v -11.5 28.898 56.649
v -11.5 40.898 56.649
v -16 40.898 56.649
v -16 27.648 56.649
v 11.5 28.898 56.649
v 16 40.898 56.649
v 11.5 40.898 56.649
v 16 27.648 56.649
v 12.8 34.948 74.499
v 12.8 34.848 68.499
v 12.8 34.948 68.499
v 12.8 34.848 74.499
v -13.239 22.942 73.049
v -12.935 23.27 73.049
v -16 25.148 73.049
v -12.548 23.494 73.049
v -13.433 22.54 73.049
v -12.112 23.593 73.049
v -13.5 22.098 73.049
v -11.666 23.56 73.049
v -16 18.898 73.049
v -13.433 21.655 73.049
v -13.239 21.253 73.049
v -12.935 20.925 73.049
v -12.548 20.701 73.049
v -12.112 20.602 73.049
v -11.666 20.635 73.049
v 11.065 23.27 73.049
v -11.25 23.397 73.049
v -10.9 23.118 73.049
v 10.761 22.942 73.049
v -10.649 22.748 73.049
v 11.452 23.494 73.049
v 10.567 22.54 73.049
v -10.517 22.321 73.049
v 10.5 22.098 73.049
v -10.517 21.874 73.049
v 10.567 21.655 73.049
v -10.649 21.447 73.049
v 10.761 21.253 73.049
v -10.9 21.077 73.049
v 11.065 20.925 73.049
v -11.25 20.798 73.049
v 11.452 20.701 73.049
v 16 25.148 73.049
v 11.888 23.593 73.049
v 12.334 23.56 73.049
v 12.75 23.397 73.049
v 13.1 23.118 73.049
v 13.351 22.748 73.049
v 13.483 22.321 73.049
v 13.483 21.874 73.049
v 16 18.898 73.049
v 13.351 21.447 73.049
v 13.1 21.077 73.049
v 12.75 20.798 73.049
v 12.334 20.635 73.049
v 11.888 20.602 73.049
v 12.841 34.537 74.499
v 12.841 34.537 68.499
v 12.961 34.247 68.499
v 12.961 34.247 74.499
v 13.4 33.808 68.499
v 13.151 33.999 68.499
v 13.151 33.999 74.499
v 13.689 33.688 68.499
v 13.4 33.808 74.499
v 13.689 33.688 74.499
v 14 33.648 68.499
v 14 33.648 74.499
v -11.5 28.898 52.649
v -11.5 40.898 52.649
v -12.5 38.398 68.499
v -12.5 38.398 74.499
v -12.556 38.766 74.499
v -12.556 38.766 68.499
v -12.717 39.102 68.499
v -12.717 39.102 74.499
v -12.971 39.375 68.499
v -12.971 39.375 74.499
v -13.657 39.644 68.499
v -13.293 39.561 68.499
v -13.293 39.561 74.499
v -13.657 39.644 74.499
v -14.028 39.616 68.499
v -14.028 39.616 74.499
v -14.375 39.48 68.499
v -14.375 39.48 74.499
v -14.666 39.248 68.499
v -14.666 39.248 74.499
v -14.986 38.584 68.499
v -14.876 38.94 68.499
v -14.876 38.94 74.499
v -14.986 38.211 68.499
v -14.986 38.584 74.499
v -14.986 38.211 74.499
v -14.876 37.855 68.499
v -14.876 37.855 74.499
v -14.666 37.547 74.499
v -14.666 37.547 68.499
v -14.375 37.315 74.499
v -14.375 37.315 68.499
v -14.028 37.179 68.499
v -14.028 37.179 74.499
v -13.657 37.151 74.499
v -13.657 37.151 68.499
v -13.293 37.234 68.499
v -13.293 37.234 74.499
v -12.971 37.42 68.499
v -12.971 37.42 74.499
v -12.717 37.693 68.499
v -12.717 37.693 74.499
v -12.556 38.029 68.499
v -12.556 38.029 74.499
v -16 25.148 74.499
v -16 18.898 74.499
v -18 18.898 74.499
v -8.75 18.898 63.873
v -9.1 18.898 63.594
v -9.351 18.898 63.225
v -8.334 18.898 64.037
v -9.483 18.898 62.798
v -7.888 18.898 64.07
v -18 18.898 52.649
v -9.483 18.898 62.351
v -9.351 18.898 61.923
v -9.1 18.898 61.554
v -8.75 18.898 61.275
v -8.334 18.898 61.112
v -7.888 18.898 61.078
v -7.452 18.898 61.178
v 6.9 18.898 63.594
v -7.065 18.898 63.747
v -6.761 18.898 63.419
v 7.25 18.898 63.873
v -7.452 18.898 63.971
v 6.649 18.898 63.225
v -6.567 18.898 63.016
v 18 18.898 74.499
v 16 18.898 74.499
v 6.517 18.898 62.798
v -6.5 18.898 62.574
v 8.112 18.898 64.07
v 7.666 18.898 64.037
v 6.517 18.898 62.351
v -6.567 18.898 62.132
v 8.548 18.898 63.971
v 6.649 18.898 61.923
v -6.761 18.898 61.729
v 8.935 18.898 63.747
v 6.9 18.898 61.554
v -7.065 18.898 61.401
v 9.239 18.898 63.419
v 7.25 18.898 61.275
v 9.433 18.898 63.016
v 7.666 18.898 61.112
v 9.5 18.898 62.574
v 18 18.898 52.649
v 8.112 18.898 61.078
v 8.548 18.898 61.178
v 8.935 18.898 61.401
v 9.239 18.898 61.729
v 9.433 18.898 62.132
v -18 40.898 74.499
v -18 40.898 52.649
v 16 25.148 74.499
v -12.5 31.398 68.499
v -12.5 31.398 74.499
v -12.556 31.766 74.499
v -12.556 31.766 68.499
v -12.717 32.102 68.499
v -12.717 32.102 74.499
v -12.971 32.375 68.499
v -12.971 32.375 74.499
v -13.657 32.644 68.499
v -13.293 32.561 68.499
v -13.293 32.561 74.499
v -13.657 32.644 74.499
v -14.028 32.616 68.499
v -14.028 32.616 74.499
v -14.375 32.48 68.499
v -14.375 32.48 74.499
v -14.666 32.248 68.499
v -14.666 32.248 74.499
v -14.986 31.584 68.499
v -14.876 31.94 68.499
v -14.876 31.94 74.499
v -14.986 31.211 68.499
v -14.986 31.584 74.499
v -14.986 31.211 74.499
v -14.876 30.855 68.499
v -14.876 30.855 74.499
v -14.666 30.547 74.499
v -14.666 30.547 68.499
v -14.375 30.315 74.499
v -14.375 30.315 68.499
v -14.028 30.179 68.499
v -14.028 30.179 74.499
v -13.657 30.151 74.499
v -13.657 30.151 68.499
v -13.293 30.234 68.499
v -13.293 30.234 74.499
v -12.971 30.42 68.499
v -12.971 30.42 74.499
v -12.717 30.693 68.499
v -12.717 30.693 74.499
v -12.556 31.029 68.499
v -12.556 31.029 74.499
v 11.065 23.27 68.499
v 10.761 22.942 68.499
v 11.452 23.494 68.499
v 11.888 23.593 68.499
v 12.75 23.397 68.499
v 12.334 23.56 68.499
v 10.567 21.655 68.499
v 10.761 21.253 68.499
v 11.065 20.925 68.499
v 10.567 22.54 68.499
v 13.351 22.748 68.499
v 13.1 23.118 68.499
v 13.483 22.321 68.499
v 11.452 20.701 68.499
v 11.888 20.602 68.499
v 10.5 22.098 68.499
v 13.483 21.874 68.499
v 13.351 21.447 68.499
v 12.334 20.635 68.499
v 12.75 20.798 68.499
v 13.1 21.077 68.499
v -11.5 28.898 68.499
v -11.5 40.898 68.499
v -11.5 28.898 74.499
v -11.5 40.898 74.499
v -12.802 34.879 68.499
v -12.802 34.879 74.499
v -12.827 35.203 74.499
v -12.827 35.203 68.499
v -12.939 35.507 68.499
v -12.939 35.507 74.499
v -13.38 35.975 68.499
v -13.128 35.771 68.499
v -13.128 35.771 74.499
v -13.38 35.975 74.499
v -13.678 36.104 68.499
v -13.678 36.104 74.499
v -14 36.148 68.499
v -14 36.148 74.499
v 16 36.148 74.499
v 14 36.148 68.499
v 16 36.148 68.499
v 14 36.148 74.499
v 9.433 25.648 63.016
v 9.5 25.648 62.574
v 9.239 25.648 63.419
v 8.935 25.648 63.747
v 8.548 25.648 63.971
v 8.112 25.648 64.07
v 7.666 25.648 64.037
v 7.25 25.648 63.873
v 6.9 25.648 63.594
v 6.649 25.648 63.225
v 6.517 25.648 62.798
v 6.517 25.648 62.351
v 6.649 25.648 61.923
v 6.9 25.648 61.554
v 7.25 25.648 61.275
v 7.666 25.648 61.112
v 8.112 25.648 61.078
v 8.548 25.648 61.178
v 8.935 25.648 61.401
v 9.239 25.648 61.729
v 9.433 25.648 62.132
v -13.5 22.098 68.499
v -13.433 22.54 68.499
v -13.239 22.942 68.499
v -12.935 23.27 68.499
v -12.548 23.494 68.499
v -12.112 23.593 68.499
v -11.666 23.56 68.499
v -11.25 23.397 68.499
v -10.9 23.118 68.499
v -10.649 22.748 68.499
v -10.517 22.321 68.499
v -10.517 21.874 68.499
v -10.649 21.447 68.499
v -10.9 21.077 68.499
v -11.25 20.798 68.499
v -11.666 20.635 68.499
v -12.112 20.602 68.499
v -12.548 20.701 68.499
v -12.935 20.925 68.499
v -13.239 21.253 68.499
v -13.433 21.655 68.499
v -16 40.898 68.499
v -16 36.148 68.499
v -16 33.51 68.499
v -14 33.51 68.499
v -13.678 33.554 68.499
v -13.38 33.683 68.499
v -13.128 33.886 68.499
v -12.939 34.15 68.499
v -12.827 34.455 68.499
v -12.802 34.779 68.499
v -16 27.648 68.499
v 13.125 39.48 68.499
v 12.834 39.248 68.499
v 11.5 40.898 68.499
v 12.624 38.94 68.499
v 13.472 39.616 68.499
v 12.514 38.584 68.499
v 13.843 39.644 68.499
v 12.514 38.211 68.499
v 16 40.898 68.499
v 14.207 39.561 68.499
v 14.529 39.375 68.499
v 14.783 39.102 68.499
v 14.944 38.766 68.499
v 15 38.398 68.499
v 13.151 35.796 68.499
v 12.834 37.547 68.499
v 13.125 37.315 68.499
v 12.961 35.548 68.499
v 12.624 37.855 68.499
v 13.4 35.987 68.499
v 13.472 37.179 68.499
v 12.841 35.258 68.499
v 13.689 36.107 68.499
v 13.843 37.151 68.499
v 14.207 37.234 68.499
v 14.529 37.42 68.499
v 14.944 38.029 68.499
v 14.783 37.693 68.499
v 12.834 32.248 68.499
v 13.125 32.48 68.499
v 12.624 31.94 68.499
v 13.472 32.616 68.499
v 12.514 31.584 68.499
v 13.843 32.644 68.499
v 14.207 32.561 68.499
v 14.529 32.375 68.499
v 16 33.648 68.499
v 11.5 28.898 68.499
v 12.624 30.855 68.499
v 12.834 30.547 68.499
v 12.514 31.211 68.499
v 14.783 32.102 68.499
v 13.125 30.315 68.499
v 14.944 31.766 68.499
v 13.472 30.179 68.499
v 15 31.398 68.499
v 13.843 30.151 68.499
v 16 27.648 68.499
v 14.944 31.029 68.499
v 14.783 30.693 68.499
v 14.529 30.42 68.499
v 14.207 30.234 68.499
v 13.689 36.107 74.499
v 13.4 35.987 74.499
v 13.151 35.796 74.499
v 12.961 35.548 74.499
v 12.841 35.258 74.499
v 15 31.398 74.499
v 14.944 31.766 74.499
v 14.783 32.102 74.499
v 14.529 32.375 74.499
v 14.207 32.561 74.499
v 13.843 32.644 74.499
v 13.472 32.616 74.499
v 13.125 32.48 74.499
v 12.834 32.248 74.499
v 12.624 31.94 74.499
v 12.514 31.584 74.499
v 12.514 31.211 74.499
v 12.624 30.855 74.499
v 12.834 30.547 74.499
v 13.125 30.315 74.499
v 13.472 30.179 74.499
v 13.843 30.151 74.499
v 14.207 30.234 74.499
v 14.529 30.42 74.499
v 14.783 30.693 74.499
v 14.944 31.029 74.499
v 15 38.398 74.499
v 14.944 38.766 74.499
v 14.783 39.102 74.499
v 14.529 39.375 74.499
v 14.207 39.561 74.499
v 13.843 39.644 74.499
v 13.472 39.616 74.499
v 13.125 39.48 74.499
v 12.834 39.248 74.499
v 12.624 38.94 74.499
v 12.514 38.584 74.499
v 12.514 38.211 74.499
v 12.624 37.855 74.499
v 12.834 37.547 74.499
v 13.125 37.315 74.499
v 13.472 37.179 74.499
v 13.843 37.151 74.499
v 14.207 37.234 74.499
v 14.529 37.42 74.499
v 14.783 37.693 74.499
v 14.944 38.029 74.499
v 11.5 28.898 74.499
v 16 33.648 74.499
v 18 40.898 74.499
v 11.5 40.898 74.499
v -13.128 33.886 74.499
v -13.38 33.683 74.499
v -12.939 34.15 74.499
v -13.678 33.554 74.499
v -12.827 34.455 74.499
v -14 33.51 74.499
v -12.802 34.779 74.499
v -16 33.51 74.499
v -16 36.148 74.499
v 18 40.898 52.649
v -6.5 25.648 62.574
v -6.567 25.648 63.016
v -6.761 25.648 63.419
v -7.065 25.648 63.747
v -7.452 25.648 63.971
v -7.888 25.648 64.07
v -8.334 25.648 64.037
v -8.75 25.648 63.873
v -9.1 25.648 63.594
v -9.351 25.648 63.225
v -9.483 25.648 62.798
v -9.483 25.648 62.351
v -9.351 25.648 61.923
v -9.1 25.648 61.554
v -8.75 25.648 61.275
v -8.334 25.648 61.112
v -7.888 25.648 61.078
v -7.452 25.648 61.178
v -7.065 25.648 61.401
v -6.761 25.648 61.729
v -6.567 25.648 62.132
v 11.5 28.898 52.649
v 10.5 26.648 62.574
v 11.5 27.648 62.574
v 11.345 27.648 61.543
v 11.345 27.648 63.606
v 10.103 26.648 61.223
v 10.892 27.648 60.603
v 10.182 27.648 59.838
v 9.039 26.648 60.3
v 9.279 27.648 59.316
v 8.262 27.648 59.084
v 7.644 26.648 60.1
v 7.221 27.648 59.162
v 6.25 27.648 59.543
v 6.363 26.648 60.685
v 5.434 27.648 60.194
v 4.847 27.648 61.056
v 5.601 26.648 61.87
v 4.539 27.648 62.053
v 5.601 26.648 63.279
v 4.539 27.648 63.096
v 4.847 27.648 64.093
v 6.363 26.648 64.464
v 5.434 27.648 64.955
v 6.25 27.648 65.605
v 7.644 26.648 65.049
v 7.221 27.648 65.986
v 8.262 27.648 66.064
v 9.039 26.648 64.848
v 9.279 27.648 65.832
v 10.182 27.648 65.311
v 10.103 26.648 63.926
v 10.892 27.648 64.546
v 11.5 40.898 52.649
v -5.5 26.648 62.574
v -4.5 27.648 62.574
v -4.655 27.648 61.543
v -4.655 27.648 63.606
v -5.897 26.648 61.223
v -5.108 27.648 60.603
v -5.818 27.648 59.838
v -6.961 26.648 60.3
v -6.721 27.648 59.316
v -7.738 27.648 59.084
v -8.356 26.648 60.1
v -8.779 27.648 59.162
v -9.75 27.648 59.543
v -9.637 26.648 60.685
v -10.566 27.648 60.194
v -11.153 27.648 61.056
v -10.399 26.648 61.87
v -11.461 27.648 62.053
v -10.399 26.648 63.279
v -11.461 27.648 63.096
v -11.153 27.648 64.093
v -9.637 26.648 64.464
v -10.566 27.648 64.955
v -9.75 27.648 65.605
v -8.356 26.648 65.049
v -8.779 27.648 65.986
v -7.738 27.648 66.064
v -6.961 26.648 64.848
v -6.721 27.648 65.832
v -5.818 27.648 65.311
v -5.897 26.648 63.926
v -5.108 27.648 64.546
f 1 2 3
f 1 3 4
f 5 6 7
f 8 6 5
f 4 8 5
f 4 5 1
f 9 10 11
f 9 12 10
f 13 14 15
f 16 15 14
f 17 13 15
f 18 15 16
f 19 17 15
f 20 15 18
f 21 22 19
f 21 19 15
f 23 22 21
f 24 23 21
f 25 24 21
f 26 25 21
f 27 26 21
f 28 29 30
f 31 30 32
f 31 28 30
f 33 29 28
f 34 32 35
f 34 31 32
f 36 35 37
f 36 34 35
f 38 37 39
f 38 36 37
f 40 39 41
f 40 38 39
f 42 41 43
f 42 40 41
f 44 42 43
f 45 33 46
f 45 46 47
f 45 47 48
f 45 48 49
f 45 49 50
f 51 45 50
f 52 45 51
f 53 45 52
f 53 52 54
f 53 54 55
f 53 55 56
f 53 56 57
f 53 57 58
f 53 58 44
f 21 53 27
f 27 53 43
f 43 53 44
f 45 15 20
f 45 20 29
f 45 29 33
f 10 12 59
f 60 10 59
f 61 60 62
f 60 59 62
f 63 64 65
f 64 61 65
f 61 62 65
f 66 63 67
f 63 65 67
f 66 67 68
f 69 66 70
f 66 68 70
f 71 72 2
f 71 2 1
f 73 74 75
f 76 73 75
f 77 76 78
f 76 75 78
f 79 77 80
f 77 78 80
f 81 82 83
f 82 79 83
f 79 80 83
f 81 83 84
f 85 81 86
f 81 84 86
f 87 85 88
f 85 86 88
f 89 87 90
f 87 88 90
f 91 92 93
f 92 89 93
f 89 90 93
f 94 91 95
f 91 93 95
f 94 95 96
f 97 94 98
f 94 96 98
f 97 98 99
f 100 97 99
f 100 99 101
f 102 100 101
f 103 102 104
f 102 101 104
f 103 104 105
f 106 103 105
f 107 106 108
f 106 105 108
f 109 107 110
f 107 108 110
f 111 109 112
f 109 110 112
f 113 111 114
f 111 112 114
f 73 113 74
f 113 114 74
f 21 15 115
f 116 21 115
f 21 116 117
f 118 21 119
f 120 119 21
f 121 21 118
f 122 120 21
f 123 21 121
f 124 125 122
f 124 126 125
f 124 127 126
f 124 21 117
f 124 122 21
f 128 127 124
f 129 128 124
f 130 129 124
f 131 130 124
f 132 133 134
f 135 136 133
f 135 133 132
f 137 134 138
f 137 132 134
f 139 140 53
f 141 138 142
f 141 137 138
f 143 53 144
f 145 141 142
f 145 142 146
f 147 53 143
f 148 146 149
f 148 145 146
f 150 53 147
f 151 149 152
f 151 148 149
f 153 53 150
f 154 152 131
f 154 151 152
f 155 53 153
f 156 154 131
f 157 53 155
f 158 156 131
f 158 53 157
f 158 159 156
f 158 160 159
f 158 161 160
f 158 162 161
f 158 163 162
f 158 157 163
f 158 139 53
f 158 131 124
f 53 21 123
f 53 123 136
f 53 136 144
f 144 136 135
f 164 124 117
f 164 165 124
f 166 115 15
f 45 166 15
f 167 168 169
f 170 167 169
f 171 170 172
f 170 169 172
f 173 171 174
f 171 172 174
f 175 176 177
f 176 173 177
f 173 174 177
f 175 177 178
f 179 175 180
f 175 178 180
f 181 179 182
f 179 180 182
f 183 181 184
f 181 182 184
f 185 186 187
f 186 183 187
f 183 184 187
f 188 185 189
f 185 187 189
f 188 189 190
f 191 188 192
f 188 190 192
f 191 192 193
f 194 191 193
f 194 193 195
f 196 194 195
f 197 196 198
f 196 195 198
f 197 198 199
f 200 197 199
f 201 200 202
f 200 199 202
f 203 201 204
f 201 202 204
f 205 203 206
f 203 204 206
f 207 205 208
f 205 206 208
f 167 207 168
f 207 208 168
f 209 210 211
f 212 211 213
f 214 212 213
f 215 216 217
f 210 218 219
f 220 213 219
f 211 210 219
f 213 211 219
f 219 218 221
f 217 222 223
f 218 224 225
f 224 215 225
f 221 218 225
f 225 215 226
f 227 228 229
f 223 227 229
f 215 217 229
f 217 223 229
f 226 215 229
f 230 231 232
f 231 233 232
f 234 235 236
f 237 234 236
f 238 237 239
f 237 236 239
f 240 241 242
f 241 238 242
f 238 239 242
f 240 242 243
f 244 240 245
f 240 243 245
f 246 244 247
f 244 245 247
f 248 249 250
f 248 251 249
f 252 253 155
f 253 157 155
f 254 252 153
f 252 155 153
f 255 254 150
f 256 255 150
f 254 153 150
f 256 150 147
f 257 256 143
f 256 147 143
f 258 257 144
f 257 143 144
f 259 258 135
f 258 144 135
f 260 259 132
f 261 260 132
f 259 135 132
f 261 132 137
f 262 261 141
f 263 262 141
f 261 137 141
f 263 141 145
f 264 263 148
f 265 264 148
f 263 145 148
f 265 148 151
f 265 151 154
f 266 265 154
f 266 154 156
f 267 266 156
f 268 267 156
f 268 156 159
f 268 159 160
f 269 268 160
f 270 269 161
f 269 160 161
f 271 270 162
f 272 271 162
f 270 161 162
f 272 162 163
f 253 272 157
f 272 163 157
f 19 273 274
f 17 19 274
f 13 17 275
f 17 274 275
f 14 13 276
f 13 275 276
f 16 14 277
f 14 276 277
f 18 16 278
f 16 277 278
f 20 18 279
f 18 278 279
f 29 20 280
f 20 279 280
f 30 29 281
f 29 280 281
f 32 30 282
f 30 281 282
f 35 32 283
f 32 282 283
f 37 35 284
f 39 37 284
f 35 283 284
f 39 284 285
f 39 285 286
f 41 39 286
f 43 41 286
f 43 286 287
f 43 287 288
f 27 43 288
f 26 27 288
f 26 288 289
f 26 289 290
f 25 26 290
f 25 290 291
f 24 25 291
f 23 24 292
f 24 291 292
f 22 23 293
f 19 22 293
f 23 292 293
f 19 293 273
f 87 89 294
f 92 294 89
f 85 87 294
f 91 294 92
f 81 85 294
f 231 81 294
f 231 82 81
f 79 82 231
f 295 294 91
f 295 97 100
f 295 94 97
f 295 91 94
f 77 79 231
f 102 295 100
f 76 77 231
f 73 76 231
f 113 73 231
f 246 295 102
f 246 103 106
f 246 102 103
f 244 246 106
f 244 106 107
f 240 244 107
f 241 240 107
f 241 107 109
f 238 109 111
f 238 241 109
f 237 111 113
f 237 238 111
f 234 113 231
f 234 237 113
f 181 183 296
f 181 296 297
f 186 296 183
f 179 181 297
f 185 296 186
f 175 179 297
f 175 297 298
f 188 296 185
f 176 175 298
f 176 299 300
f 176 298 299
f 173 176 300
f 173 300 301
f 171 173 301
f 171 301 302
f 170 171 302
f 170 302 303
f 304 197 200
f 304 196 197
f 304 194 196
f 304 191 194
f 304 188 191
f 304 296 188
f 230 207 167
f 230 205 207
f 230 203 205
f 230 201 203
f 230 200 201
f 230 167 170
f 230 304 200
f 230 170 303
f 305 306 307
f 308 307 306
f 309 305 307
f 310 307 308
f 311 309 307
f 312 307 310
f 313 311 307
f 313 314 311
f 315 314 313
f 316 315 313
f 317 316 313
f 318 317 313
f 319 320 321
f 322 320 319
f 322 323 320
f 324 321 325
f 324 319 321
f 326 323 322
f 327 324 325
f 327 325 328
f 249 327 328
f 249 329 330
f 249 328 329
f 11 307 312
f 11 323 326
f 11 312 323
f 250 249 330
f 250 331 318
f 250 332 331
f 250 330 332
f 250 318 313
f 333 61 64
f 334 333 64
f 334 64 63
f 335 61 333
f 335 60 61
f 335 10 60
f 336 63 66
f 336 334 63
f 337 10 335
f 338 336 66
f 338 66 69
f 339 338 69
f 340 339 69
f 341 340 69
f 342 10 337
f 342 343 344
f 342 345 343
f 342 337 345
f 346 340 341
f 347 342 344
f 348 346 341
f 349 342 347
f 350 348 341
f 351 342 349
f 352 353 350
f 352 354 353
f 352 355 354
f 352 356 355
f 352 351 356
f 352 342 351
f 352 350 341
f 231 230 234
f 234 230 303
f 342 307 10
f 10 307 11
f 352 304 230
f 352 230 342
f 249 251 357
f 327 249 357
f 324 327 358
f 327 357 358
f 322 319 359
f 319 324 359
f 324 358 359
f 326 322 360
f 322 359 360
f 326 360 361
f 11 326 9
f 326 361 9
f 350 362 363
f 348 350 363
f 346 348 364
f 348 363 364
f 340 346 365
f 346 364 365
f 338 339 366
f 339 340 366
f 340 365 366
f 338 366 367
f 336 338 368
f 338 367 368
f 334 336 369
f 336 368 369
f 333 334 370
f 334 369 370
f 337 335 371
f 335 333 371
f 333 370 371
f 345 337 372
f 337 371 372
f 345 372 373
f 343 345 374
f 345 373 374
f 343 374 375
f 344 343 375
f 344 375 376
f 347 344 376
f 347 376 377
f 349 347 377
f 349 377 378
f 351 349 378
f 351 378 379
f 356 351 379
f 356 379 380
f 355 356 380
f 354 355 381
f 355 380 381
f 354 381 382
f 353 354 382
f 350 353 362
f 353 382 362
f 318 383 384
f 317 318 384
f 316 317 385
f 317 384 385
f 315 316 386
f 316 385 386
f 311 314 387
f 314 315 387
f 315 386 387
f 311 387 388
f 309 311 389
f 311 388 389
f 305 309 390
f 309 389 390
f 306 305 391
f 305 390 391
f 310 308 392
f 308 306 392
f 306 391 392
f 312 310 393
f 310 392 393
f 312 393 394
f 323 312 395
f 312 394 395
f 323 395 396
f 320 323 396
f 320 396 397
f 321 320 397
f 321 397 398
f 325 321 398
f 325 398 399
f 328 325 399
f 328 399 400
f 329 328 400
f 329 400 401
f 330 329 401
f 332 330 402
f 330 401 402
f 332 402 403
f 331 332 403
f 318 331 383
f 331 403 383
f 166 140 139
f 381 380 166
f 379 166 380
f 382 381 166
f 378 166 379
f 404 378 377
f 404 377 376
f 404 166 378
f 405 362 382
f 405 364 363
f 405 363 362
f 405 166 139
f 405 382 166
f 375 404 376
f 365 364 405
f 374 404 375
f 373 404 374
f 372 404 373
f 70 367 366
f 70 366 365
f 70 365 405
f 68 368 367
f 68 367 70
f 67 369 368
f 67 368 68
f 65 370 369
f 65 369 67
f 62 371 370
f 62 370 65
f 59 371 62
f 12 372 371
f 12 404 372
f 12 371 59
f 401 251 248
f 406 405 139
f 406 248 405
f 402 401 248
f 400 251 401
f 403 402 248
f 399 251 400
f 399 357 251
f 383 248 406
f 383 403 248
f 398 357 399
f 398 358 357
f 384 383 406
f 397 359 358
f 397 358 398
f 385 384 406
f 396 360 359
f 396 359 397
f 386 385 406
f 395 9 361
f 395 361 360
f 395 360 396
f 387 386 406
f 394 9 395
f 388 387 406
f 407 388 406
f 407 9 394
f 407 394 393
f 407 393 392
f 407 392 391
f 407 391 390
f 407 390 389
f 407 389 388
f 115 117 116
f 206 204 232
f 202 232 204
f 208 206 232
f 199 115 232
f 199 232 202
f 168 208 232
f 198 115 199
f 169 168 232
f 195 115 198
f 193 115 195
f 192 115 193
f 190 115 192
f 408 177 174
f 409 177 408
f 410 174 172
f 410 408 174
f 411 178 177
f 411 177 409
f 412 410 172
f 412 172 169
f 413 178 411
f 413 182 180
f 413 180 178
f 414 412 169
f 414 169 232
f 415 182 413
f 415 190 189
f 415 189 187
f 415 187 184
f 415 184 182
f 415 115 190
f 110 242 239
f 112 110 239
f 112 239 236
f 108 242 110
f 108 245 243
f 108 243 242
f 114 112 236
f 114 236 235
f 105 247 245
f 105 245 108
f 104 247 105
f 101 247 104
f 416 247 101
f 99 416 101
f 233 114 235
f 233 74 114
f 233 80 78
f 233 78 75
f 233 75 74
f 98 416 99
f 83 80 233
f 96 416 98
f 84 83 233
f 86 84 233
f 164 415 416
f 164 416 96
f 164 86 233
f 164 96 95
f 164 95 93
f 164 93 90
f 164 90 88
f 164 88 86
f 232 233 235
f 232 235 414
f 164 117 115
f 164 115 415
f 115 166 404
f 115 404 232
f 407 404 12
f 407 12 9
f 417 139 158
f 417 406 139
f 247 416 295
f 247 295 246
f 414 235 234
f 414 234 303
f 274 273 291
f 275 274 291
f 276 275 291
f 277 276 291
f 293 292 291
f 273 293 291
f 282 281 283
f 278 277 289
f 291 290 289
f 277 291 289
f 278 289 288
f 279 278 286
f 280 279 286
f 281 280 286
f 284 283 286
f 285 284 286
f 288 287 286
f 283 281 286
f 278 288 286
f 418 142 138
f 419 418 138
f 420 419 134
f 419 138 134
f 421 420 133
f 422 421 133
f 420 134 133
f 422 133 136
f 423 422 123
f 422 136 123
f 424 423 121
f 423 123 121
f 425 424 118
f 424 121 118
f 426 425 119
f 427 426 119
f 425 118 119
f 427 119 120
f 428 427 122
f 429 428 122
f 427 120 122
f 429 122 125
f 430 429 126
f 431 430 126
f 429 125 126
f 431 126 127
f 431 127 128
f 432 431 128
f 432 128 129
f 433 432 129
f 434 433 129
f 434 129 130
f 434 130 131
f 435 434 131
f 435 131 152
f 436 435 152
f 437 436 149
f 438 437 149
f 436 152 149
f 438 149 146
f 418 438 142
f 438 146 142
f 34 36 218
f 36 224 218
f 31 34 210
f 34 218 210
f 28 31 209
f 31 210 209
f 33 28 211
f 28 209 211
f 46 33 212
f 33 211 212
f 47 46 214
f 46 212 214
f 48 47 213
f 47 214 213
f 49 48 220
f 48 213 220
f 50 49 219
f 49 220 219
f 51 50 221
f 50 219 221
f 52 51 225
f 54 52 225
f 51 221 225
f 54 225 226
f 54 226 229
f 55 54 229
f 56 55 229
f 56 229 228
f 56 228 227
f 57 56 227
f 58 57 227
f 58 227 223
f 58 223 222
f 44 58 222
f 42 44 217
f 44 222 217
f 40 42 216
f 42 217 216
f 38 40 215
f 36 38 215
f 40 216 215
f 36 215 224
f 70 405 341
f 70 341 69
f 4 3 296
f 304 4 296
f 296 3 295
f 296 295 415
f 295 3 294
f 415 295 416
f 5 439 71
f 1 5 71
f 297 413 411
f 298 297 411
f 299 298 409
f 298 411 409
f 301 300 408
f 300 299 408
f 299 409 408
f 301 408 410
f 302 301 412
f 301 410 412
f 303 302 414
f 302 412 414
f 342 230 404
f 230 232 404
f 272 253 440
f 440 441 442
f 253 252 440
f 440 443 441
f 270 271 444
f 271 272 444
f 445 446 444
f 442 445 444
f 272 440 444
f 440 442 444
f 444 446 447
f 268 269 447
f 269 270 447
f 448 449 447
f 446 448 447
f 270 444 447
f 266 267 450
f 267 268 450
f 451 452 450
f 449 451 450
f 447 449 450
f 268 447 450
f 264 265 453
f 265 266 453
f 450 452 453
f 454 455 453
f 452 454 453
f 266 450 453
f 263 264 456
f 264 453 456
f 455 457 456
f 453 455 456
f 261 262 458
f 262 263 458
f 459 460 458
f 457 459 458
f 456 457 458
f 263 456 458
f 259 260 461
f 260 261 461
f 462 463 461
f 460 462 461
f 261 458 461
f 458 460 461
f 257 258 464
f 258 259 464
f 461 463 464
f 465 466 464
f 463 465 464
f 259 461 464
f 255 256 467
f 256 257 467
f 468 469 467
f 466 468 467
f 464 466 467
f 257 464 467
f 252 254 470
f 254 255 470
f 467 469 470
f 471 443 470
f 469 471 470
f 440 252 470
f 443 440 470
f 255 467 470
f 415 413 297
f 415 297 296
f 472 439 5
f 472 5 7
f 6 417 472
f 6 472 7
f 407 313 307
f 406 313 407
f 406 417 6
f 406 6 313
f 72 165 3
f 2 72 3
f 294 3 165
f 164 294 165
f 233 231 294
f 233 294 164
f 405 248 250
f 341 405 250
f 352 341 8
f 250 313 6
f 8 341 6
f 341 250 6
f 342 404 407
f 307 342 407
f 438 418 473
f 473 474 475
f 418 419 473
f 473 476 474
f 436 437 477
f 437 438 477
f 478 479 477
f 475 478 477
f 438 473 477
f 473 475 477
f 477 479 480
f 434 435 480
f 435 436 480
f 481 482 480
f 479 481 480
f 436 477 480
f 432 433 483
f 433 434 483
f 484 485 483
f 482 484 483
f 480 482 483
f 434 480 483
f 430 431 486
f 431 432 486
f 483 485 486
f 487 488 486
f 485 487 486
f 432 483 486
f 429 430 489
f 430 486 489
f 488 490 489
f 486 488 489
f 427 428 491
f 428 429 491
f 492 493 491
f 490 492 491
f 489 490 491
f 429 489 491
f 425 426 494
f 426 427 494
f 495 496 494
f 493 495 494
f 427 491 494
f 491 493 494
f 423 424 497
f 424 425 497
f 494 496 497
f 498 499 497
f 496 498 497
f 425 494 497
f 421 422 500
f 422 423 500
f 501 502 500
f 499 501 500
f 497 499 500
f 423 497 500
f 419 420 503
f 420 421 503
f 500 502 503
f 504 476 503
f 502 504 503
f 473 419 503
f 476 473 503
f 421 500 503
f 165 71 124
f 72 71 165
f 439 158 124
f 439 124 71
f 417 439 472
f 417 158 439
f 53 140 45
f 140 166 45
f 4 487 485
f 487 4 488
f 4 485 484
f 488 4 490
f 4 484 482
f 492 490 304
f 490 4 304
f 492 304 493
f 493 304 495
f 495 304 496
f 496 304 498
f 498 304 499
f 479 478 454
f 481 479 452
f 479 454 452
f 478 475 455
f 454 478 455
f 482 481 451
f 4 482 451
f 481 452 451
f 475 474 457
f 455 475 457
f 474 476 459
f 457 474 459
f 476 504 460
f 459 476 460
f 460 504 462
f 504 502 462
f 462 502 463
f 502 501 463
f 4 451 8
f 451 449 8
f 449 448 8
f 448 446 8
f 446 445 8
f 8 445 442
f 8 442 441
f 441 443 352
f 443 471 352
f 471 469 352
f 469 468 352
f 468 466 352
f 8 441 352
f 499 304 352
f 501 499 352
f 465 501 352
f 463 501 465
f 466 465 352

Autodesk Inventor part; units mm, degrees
ref_plane "РабПлоскость1" through (0, 34.8975, 74.4992) normal (0, 0, -1) x (1, 0, 0)
sketch "Эскиз1" plane through (0, 34.8975, 74.4992) normal (0, 0, -1) x (1, 0, 0)
  line L0 (11.5, 6) -> (11.5, -6) projected
  line L1 (15, -6) -> (11.5, -6) projected
  arc A0 (15, -6) -> (16, -5) centre (15, -5) ccw projected
  line L2 (16, -1.25) -> (16, -5) projected
  line L3 (14, -1.25) -> (16, -1.25) projected
  arc A1 (12.8, -0.05) -> (14, -1.25) centre (14, -0.05) ccw projected
  line L4 (12.8, 0.05) -> (12.8, -0.05) projected
  arc A2 (14, 1.25) -> (12.8, 0.05) centre (14, 0.05) ccw projected
  line L5 (16, 1.25) -> (14, 1.25) projected
  line L6 (16, 5) -> (16, 1.25) projected
  arc A3 (16, 5) -> (15, 6) centre (15, 5) ccw projected
  line L7 (11.5, 6) -> (15, 6) projected
  circle A4 centre (13.75, 3.5) radius 1.25 projected
  circle A5 centre (13.75, -3.5) radius 1.25 projected
  line L8 (-11.5, -6) -> (-11.5, 6) projected
  line L9 (-15, 6) -> (-11.5, 6) projected
  arc A6 (-15, 6) -> (-16, 5) centre (-15, 5) ccw projected
  line L10 (-16, 1.3872) -> (-16, 5) projected
  line L11 (-14, 1.3872) -> (-16, 1.3872) projected
  arc A7 (-12.802, 0.1186) -> (-14, 1.3872) centre (-14, 0.1872) ccw projected
  line L12 (-12.802, 0.0186) -> (-12.802, 0.1186) projected
  arc A8 (-14, -1.25) -> (-12.802, 0.0186) centre (-14, -0.05) ccw projected
  line L13 (-16, -1.25) -> (-14, -1.25) projected
  line L14 (-16, -5) -> (-16, -1.25) projected
  arc A9 (-16, -5) -> (-15, -6) centre (-15, -5) ccw projected
  line L15 (-11.5, -6) -> (-15, -6) projected
  circle A10 centre (-13.75, 3.5) radius 1.25 projected
  circle A11 centre (-13.75, -3.5) radius 1.25 projected
  line L16 (16, 5) -> (16, 6)
  line L17 (16, 6) -> (15, 6)
  line L18 (-16, 5) -> (-16, 6)
  line L19 (-16, 6) -> (-15, 6)
  line L20 (16, -5) -> (16, -6)
  line L21 (16, -6) -> (15, -6)
  line L22 (-16, -5) -> (-16, -6)
  line L23 (-16, -6) -> (-15, -6)
  point P0 (0, 34.8975)
extrude "Выдавливание1" add sketch "Эскиз1" along normal blind 6
sketch "Эскиз3" plane through (11.5, 28.8975, 74.4992) normal (0, -1, 0) x (1, 0, 0)
  line L0 (-23, 0) -> (-23, -6) projected
  line L1 (-23, -6) -> (-23, 0)
  line L2 (-23, 0) -> (-27.5, 0)
  line L3 (0, -6) -> (-23, -6)
  line L4 (-23, -6) -> (-23, 0)
  line L5 (-23, 0) -> (0, 0)
  line L6 (-23, -6) -> (-27.5, -6) projected
  line L7 (-23, -6) -> (-27.5, -6)
  line L8 (-27.5, -6) -> (-27.5, 0)
  line L9 (0, 0) -> (4.5, 0)
  line L10 (0, -6) -> (0, 0)
  line L11 (4.5, 0) -> (4.5, -6)
  line L12 (4.5, -6) -> (0, -6)
  point P0 (-11.5, -74.4992)
  point P1 (4.5, 0)
extrude "Выдавливание2" add sketch "Эскиз3" along normal blind 30
ref_plane "РабПлоскость2" through (-11.5, 28.8975, 52.6492) normal (0, 0, -1) x (0, 1, 0)
ref_plane "РабПлоскость3" through (-11.5, 28.8975, 52.6492) normal (0, 0, -1) x (0, 1, 0)
ref_plane "РабПлоскость6" through (-16, 2.8975, 68.4992) normal (0, 1, 0) x (1, 0, 0)
ref_plane "РабПлоскость4" through (-15, 28.8975, 52.6492) normal (0, -1, 0) x (1, 0, 0)
ref_plane "РабПлоскость8" through (-16, 2.8975, 68.4992) normal (0, 1, 0) x (1, 0, 0)
ref_plane "РабПлоскость5" through (-16, 2.8975, 68.4992) normal (0, 1, 0) x (1, 0, 0)
ref_plane "РабПлоскость7" through (16, 28.8975, 74.4992) normal (1, 0, 0) x (0, 0, -1)
ref_plane "РабПлоскость9" through (16, 28.8975, 74.4992) normal (-1, 0, 0) x (0, 0, 1)
ref_plane "РабПлоскость10" through (-16, 28.8975, 74.4992) normal (-1, 0, 0) x (0, 0, 1)
sketch "Эскиз14" plane through (11.5, -1.1025, 74.4992) normal (0, -1, 0) x (1, 0, 0)
  circle A0 centre (-3.5, -11.925) radius 2 projected
  circle A1 centre (-19.5, -11.925) radius 2 projected
  circle A2 centre (-3.5, -11.925) radius 1.5
  circle A3 centre (-19.5, -11.925) radius 1.5
  point P0 (-11.5, -74.4992)
  dimension "d38" = 3
  dimension "d39" = 3
extrude "Выдавливание12" add sketch "Эскиз14" against normal blind 4
ref_plane "РабПлоскость14" through (18, 28.8975, 74.4992) normal (1, 0, 0) x (0, 0, -1)
sketch "Эскиз15" plane through (18, 28.8975, 74.4992) normal (1, 0, 0) x (0, 0, -1)
  line L0 (1.45, -3.75) -> (1.45, -63.75) projected
  line L1 (-2.55, -3.75) -> (1.45, -3.75) projected
  line L2 (-2.55, -3.75) -> (1.45, -3.75)
  line L3 (1.45, -3.75) -> (1.45, -34.5952)
  line L4 (1.45, -34.5952) -> (-2.55, -34.5952)
  line L5 (-2.55, -34.5952) -> (-2.55, -3.75)
  point P0 (74.4992, -28.8975)
extrude "Выдавливание13" cut sketch "Эскиз15" against normal blind 100
ref_plane "РабПлоскость13" through (16, 2.8975, 68.4992) normal (0, 1, 0) x (1, 0, 0)
ref_plane "РабПлоскость12" through (-18, 28.8975, 74.4992) normal (-1, 0, 0) x (0, 0, 1)
ref_plane "РабПлоскость11" through (16, 28.8975, 52.6492) normal (0, 0, -1) x (-1, 0, 0)
sketch "Эскиз18" plane through (16, 28.8975, 52.6492) normal (0, 0, -1) x (-1, 0, 0)
  circle A0 centre (4, -6.8) radius 1.5 projected
  circle A1 centre (28, -6.8) radius 1.5 projected
  point P0 (16, -28.8975)
extrude "Выдавливание16" cut sketch "Эскиз18" along normal mid plane 73
sketch "Эскиз19" plane through (0, 34.8975, 68.4992) normal (0, 0, -1) x (-1, 0, 0)
  line L0 (-16, -36) -> (16, -36) projected
  line L1 (16, -1.3872) -> (16, -36) projected
  line L2 (-16, -36) -> (16, -36)
  line L3 (16, -36) -> (16, -16)
  line L4 (16, -16) -> (-16, -16)
  line L5 (-16, -16) -> (-16, -36)
  point P0 (0, -34.8975)
  point P1 (11.5, -36)
  point P2 (16, -36)
  dimension "d57" = 20
extrude "Выдавливание17" cut sketch "Эскиз19" along normal mid plane 200
sketch "Эскиз13" plane through (-16, 28.8975, 74.4992) normal (-1, 0, 0) x (0, 0, 1)
  line L0 (-21.85, 12) -> (0, 12)
  line L1 (0, 12) -> (0, -10)
  line L2 (0, -10) -> (-21.85, -10)
  line L3 (-21.85, -10) -> (-21.85, 12)
  line L4 (0, 4.6128) -> (0, -3.75) projected
  point P0 (-74.4992, -28.8975)
  point P1 (0, 12)
  point P2 (-21.85, -30)
  dimension "d60" = 21.85
  dimension "d61" = 22
  dimension "d62" = 0
sketch "Эскиз10" plane through (16, 28.8975, 74.4992) normal (1, 0, 0) x (0, 0, -1)
  line L0 (0, 12) -> (21.85, 12)
  line L1 (21.85, 12) -> (21.85, -10)
  line L2 (21.85, -10) -> (0, -10)
  line L3 (0, -10) -> (0, 12)
  line L4 (0, 12) -> (6, 12) projected
  line L5 (0, 4.75) -> (0, -3.75) projected
  point P0 (74.4992, -28.8975)
  point P1 (21.85, -30)
  dimension "d63" = 21.85
  dimension "d64" = 22
  dimension "d65" = 0
  dimension "d66" = 0
extrude "Выдавливание18" add sketch "Эскиз13" along normal blind 2
extrude "Выдавливание19" add sketch "Эскиз10" along normal blind 2
sketch "Эскиз20" plane through (-16, 18.8975, 52.6492) normal (0, -1, 0) x (1, 0, 0)
  line L0 (32, 4) -> (0, 4)
  line L1 (0, 4) -> (0, 15.85)
  line L2 (0, 15.85) -> (32, 15.85)
  line L3 (32, 15.85) -> (32, 4)
  line L4 (0, 0) -> (0, 15.85) projected
  line L5 (32, 15.85) -> (0, 15.85) projected
  circle A0 centre (24, 9.925) radius 1.5
  circle A1 centre (8, 9.925) radius 1.5
  point P0 (16, -52.6492)
  dimension "d71" = 32
  dimension "d72" = 11.85
  dimension "d73" = 0
  dimension "d74" = 0
  dimension "d75" = 3
  dimension "d76" = 3
  dimension "d77" = 8
  dimension "d78" = 8
  dimension "d79" = 5.925
  dimension "d80" = 5.925
extrude "Выдавливание20" add sketch "Эскиз20" against normal blind 8.75
sketch "Эскиз21" plane through (16, 28.8975, 74.4992) normal (-1, 0, 0) x (0, 0, 1)
  line L0 (-21.85, 12) -> (-17.85, 12)
  line L1 (-17.85, 12) -> (-17.85, -10)
  line L2 (-17.85, -10) -> (-21.85, -10)
  line L3 (-21.85, -10) -> (-21.85, 12)
  line L4 (-17.85, -10) -> (-21.85, -10) projected
  line L5 (-17.85, -10) -> (-17.85, -1.25) projected
  point P0 (-74.4992, -28.8975)
  point P1 (-19.85, -10)
  dimension "d83" = 4
  dimension "d84" = 22
  dimension "d85" = 0
  dimension "d86" = 0
extrude "Выдавливание21" add sketch "Эскиз21" along normal blind 32.5
sketch "Эскиз22" plane through (-18, 18.8975, 52.6492) normal (0, 0, -1) x (-1, 0, 0)
  line L0 (-29.5, 10) -> (-29.5, 22) projected
  line L1 (-6.5, 22) -> (-6.5, 10) projected
  line L2 (-29.5, 10) -> (-6.5, 10)
  line L3 (-6.5, 10) -> (-6.5, 22)
  line L4 (-6.5, 22) -> (-29.5, 22)
  line L5 (-29.5, 22) -> (-29.5, 10)
  point P0 (-18, -18.8975)
extrude "Выдавливание22" cut sketch "Эскиз22" against normal blind 32.5
chamfer "Фаска1" distance 2 angle 45 2 edges at (6.5, 27.6475, 62.5742) (-9.5, 27.6475, 62.5742)
properties part number "держатель сервомоторчика"
